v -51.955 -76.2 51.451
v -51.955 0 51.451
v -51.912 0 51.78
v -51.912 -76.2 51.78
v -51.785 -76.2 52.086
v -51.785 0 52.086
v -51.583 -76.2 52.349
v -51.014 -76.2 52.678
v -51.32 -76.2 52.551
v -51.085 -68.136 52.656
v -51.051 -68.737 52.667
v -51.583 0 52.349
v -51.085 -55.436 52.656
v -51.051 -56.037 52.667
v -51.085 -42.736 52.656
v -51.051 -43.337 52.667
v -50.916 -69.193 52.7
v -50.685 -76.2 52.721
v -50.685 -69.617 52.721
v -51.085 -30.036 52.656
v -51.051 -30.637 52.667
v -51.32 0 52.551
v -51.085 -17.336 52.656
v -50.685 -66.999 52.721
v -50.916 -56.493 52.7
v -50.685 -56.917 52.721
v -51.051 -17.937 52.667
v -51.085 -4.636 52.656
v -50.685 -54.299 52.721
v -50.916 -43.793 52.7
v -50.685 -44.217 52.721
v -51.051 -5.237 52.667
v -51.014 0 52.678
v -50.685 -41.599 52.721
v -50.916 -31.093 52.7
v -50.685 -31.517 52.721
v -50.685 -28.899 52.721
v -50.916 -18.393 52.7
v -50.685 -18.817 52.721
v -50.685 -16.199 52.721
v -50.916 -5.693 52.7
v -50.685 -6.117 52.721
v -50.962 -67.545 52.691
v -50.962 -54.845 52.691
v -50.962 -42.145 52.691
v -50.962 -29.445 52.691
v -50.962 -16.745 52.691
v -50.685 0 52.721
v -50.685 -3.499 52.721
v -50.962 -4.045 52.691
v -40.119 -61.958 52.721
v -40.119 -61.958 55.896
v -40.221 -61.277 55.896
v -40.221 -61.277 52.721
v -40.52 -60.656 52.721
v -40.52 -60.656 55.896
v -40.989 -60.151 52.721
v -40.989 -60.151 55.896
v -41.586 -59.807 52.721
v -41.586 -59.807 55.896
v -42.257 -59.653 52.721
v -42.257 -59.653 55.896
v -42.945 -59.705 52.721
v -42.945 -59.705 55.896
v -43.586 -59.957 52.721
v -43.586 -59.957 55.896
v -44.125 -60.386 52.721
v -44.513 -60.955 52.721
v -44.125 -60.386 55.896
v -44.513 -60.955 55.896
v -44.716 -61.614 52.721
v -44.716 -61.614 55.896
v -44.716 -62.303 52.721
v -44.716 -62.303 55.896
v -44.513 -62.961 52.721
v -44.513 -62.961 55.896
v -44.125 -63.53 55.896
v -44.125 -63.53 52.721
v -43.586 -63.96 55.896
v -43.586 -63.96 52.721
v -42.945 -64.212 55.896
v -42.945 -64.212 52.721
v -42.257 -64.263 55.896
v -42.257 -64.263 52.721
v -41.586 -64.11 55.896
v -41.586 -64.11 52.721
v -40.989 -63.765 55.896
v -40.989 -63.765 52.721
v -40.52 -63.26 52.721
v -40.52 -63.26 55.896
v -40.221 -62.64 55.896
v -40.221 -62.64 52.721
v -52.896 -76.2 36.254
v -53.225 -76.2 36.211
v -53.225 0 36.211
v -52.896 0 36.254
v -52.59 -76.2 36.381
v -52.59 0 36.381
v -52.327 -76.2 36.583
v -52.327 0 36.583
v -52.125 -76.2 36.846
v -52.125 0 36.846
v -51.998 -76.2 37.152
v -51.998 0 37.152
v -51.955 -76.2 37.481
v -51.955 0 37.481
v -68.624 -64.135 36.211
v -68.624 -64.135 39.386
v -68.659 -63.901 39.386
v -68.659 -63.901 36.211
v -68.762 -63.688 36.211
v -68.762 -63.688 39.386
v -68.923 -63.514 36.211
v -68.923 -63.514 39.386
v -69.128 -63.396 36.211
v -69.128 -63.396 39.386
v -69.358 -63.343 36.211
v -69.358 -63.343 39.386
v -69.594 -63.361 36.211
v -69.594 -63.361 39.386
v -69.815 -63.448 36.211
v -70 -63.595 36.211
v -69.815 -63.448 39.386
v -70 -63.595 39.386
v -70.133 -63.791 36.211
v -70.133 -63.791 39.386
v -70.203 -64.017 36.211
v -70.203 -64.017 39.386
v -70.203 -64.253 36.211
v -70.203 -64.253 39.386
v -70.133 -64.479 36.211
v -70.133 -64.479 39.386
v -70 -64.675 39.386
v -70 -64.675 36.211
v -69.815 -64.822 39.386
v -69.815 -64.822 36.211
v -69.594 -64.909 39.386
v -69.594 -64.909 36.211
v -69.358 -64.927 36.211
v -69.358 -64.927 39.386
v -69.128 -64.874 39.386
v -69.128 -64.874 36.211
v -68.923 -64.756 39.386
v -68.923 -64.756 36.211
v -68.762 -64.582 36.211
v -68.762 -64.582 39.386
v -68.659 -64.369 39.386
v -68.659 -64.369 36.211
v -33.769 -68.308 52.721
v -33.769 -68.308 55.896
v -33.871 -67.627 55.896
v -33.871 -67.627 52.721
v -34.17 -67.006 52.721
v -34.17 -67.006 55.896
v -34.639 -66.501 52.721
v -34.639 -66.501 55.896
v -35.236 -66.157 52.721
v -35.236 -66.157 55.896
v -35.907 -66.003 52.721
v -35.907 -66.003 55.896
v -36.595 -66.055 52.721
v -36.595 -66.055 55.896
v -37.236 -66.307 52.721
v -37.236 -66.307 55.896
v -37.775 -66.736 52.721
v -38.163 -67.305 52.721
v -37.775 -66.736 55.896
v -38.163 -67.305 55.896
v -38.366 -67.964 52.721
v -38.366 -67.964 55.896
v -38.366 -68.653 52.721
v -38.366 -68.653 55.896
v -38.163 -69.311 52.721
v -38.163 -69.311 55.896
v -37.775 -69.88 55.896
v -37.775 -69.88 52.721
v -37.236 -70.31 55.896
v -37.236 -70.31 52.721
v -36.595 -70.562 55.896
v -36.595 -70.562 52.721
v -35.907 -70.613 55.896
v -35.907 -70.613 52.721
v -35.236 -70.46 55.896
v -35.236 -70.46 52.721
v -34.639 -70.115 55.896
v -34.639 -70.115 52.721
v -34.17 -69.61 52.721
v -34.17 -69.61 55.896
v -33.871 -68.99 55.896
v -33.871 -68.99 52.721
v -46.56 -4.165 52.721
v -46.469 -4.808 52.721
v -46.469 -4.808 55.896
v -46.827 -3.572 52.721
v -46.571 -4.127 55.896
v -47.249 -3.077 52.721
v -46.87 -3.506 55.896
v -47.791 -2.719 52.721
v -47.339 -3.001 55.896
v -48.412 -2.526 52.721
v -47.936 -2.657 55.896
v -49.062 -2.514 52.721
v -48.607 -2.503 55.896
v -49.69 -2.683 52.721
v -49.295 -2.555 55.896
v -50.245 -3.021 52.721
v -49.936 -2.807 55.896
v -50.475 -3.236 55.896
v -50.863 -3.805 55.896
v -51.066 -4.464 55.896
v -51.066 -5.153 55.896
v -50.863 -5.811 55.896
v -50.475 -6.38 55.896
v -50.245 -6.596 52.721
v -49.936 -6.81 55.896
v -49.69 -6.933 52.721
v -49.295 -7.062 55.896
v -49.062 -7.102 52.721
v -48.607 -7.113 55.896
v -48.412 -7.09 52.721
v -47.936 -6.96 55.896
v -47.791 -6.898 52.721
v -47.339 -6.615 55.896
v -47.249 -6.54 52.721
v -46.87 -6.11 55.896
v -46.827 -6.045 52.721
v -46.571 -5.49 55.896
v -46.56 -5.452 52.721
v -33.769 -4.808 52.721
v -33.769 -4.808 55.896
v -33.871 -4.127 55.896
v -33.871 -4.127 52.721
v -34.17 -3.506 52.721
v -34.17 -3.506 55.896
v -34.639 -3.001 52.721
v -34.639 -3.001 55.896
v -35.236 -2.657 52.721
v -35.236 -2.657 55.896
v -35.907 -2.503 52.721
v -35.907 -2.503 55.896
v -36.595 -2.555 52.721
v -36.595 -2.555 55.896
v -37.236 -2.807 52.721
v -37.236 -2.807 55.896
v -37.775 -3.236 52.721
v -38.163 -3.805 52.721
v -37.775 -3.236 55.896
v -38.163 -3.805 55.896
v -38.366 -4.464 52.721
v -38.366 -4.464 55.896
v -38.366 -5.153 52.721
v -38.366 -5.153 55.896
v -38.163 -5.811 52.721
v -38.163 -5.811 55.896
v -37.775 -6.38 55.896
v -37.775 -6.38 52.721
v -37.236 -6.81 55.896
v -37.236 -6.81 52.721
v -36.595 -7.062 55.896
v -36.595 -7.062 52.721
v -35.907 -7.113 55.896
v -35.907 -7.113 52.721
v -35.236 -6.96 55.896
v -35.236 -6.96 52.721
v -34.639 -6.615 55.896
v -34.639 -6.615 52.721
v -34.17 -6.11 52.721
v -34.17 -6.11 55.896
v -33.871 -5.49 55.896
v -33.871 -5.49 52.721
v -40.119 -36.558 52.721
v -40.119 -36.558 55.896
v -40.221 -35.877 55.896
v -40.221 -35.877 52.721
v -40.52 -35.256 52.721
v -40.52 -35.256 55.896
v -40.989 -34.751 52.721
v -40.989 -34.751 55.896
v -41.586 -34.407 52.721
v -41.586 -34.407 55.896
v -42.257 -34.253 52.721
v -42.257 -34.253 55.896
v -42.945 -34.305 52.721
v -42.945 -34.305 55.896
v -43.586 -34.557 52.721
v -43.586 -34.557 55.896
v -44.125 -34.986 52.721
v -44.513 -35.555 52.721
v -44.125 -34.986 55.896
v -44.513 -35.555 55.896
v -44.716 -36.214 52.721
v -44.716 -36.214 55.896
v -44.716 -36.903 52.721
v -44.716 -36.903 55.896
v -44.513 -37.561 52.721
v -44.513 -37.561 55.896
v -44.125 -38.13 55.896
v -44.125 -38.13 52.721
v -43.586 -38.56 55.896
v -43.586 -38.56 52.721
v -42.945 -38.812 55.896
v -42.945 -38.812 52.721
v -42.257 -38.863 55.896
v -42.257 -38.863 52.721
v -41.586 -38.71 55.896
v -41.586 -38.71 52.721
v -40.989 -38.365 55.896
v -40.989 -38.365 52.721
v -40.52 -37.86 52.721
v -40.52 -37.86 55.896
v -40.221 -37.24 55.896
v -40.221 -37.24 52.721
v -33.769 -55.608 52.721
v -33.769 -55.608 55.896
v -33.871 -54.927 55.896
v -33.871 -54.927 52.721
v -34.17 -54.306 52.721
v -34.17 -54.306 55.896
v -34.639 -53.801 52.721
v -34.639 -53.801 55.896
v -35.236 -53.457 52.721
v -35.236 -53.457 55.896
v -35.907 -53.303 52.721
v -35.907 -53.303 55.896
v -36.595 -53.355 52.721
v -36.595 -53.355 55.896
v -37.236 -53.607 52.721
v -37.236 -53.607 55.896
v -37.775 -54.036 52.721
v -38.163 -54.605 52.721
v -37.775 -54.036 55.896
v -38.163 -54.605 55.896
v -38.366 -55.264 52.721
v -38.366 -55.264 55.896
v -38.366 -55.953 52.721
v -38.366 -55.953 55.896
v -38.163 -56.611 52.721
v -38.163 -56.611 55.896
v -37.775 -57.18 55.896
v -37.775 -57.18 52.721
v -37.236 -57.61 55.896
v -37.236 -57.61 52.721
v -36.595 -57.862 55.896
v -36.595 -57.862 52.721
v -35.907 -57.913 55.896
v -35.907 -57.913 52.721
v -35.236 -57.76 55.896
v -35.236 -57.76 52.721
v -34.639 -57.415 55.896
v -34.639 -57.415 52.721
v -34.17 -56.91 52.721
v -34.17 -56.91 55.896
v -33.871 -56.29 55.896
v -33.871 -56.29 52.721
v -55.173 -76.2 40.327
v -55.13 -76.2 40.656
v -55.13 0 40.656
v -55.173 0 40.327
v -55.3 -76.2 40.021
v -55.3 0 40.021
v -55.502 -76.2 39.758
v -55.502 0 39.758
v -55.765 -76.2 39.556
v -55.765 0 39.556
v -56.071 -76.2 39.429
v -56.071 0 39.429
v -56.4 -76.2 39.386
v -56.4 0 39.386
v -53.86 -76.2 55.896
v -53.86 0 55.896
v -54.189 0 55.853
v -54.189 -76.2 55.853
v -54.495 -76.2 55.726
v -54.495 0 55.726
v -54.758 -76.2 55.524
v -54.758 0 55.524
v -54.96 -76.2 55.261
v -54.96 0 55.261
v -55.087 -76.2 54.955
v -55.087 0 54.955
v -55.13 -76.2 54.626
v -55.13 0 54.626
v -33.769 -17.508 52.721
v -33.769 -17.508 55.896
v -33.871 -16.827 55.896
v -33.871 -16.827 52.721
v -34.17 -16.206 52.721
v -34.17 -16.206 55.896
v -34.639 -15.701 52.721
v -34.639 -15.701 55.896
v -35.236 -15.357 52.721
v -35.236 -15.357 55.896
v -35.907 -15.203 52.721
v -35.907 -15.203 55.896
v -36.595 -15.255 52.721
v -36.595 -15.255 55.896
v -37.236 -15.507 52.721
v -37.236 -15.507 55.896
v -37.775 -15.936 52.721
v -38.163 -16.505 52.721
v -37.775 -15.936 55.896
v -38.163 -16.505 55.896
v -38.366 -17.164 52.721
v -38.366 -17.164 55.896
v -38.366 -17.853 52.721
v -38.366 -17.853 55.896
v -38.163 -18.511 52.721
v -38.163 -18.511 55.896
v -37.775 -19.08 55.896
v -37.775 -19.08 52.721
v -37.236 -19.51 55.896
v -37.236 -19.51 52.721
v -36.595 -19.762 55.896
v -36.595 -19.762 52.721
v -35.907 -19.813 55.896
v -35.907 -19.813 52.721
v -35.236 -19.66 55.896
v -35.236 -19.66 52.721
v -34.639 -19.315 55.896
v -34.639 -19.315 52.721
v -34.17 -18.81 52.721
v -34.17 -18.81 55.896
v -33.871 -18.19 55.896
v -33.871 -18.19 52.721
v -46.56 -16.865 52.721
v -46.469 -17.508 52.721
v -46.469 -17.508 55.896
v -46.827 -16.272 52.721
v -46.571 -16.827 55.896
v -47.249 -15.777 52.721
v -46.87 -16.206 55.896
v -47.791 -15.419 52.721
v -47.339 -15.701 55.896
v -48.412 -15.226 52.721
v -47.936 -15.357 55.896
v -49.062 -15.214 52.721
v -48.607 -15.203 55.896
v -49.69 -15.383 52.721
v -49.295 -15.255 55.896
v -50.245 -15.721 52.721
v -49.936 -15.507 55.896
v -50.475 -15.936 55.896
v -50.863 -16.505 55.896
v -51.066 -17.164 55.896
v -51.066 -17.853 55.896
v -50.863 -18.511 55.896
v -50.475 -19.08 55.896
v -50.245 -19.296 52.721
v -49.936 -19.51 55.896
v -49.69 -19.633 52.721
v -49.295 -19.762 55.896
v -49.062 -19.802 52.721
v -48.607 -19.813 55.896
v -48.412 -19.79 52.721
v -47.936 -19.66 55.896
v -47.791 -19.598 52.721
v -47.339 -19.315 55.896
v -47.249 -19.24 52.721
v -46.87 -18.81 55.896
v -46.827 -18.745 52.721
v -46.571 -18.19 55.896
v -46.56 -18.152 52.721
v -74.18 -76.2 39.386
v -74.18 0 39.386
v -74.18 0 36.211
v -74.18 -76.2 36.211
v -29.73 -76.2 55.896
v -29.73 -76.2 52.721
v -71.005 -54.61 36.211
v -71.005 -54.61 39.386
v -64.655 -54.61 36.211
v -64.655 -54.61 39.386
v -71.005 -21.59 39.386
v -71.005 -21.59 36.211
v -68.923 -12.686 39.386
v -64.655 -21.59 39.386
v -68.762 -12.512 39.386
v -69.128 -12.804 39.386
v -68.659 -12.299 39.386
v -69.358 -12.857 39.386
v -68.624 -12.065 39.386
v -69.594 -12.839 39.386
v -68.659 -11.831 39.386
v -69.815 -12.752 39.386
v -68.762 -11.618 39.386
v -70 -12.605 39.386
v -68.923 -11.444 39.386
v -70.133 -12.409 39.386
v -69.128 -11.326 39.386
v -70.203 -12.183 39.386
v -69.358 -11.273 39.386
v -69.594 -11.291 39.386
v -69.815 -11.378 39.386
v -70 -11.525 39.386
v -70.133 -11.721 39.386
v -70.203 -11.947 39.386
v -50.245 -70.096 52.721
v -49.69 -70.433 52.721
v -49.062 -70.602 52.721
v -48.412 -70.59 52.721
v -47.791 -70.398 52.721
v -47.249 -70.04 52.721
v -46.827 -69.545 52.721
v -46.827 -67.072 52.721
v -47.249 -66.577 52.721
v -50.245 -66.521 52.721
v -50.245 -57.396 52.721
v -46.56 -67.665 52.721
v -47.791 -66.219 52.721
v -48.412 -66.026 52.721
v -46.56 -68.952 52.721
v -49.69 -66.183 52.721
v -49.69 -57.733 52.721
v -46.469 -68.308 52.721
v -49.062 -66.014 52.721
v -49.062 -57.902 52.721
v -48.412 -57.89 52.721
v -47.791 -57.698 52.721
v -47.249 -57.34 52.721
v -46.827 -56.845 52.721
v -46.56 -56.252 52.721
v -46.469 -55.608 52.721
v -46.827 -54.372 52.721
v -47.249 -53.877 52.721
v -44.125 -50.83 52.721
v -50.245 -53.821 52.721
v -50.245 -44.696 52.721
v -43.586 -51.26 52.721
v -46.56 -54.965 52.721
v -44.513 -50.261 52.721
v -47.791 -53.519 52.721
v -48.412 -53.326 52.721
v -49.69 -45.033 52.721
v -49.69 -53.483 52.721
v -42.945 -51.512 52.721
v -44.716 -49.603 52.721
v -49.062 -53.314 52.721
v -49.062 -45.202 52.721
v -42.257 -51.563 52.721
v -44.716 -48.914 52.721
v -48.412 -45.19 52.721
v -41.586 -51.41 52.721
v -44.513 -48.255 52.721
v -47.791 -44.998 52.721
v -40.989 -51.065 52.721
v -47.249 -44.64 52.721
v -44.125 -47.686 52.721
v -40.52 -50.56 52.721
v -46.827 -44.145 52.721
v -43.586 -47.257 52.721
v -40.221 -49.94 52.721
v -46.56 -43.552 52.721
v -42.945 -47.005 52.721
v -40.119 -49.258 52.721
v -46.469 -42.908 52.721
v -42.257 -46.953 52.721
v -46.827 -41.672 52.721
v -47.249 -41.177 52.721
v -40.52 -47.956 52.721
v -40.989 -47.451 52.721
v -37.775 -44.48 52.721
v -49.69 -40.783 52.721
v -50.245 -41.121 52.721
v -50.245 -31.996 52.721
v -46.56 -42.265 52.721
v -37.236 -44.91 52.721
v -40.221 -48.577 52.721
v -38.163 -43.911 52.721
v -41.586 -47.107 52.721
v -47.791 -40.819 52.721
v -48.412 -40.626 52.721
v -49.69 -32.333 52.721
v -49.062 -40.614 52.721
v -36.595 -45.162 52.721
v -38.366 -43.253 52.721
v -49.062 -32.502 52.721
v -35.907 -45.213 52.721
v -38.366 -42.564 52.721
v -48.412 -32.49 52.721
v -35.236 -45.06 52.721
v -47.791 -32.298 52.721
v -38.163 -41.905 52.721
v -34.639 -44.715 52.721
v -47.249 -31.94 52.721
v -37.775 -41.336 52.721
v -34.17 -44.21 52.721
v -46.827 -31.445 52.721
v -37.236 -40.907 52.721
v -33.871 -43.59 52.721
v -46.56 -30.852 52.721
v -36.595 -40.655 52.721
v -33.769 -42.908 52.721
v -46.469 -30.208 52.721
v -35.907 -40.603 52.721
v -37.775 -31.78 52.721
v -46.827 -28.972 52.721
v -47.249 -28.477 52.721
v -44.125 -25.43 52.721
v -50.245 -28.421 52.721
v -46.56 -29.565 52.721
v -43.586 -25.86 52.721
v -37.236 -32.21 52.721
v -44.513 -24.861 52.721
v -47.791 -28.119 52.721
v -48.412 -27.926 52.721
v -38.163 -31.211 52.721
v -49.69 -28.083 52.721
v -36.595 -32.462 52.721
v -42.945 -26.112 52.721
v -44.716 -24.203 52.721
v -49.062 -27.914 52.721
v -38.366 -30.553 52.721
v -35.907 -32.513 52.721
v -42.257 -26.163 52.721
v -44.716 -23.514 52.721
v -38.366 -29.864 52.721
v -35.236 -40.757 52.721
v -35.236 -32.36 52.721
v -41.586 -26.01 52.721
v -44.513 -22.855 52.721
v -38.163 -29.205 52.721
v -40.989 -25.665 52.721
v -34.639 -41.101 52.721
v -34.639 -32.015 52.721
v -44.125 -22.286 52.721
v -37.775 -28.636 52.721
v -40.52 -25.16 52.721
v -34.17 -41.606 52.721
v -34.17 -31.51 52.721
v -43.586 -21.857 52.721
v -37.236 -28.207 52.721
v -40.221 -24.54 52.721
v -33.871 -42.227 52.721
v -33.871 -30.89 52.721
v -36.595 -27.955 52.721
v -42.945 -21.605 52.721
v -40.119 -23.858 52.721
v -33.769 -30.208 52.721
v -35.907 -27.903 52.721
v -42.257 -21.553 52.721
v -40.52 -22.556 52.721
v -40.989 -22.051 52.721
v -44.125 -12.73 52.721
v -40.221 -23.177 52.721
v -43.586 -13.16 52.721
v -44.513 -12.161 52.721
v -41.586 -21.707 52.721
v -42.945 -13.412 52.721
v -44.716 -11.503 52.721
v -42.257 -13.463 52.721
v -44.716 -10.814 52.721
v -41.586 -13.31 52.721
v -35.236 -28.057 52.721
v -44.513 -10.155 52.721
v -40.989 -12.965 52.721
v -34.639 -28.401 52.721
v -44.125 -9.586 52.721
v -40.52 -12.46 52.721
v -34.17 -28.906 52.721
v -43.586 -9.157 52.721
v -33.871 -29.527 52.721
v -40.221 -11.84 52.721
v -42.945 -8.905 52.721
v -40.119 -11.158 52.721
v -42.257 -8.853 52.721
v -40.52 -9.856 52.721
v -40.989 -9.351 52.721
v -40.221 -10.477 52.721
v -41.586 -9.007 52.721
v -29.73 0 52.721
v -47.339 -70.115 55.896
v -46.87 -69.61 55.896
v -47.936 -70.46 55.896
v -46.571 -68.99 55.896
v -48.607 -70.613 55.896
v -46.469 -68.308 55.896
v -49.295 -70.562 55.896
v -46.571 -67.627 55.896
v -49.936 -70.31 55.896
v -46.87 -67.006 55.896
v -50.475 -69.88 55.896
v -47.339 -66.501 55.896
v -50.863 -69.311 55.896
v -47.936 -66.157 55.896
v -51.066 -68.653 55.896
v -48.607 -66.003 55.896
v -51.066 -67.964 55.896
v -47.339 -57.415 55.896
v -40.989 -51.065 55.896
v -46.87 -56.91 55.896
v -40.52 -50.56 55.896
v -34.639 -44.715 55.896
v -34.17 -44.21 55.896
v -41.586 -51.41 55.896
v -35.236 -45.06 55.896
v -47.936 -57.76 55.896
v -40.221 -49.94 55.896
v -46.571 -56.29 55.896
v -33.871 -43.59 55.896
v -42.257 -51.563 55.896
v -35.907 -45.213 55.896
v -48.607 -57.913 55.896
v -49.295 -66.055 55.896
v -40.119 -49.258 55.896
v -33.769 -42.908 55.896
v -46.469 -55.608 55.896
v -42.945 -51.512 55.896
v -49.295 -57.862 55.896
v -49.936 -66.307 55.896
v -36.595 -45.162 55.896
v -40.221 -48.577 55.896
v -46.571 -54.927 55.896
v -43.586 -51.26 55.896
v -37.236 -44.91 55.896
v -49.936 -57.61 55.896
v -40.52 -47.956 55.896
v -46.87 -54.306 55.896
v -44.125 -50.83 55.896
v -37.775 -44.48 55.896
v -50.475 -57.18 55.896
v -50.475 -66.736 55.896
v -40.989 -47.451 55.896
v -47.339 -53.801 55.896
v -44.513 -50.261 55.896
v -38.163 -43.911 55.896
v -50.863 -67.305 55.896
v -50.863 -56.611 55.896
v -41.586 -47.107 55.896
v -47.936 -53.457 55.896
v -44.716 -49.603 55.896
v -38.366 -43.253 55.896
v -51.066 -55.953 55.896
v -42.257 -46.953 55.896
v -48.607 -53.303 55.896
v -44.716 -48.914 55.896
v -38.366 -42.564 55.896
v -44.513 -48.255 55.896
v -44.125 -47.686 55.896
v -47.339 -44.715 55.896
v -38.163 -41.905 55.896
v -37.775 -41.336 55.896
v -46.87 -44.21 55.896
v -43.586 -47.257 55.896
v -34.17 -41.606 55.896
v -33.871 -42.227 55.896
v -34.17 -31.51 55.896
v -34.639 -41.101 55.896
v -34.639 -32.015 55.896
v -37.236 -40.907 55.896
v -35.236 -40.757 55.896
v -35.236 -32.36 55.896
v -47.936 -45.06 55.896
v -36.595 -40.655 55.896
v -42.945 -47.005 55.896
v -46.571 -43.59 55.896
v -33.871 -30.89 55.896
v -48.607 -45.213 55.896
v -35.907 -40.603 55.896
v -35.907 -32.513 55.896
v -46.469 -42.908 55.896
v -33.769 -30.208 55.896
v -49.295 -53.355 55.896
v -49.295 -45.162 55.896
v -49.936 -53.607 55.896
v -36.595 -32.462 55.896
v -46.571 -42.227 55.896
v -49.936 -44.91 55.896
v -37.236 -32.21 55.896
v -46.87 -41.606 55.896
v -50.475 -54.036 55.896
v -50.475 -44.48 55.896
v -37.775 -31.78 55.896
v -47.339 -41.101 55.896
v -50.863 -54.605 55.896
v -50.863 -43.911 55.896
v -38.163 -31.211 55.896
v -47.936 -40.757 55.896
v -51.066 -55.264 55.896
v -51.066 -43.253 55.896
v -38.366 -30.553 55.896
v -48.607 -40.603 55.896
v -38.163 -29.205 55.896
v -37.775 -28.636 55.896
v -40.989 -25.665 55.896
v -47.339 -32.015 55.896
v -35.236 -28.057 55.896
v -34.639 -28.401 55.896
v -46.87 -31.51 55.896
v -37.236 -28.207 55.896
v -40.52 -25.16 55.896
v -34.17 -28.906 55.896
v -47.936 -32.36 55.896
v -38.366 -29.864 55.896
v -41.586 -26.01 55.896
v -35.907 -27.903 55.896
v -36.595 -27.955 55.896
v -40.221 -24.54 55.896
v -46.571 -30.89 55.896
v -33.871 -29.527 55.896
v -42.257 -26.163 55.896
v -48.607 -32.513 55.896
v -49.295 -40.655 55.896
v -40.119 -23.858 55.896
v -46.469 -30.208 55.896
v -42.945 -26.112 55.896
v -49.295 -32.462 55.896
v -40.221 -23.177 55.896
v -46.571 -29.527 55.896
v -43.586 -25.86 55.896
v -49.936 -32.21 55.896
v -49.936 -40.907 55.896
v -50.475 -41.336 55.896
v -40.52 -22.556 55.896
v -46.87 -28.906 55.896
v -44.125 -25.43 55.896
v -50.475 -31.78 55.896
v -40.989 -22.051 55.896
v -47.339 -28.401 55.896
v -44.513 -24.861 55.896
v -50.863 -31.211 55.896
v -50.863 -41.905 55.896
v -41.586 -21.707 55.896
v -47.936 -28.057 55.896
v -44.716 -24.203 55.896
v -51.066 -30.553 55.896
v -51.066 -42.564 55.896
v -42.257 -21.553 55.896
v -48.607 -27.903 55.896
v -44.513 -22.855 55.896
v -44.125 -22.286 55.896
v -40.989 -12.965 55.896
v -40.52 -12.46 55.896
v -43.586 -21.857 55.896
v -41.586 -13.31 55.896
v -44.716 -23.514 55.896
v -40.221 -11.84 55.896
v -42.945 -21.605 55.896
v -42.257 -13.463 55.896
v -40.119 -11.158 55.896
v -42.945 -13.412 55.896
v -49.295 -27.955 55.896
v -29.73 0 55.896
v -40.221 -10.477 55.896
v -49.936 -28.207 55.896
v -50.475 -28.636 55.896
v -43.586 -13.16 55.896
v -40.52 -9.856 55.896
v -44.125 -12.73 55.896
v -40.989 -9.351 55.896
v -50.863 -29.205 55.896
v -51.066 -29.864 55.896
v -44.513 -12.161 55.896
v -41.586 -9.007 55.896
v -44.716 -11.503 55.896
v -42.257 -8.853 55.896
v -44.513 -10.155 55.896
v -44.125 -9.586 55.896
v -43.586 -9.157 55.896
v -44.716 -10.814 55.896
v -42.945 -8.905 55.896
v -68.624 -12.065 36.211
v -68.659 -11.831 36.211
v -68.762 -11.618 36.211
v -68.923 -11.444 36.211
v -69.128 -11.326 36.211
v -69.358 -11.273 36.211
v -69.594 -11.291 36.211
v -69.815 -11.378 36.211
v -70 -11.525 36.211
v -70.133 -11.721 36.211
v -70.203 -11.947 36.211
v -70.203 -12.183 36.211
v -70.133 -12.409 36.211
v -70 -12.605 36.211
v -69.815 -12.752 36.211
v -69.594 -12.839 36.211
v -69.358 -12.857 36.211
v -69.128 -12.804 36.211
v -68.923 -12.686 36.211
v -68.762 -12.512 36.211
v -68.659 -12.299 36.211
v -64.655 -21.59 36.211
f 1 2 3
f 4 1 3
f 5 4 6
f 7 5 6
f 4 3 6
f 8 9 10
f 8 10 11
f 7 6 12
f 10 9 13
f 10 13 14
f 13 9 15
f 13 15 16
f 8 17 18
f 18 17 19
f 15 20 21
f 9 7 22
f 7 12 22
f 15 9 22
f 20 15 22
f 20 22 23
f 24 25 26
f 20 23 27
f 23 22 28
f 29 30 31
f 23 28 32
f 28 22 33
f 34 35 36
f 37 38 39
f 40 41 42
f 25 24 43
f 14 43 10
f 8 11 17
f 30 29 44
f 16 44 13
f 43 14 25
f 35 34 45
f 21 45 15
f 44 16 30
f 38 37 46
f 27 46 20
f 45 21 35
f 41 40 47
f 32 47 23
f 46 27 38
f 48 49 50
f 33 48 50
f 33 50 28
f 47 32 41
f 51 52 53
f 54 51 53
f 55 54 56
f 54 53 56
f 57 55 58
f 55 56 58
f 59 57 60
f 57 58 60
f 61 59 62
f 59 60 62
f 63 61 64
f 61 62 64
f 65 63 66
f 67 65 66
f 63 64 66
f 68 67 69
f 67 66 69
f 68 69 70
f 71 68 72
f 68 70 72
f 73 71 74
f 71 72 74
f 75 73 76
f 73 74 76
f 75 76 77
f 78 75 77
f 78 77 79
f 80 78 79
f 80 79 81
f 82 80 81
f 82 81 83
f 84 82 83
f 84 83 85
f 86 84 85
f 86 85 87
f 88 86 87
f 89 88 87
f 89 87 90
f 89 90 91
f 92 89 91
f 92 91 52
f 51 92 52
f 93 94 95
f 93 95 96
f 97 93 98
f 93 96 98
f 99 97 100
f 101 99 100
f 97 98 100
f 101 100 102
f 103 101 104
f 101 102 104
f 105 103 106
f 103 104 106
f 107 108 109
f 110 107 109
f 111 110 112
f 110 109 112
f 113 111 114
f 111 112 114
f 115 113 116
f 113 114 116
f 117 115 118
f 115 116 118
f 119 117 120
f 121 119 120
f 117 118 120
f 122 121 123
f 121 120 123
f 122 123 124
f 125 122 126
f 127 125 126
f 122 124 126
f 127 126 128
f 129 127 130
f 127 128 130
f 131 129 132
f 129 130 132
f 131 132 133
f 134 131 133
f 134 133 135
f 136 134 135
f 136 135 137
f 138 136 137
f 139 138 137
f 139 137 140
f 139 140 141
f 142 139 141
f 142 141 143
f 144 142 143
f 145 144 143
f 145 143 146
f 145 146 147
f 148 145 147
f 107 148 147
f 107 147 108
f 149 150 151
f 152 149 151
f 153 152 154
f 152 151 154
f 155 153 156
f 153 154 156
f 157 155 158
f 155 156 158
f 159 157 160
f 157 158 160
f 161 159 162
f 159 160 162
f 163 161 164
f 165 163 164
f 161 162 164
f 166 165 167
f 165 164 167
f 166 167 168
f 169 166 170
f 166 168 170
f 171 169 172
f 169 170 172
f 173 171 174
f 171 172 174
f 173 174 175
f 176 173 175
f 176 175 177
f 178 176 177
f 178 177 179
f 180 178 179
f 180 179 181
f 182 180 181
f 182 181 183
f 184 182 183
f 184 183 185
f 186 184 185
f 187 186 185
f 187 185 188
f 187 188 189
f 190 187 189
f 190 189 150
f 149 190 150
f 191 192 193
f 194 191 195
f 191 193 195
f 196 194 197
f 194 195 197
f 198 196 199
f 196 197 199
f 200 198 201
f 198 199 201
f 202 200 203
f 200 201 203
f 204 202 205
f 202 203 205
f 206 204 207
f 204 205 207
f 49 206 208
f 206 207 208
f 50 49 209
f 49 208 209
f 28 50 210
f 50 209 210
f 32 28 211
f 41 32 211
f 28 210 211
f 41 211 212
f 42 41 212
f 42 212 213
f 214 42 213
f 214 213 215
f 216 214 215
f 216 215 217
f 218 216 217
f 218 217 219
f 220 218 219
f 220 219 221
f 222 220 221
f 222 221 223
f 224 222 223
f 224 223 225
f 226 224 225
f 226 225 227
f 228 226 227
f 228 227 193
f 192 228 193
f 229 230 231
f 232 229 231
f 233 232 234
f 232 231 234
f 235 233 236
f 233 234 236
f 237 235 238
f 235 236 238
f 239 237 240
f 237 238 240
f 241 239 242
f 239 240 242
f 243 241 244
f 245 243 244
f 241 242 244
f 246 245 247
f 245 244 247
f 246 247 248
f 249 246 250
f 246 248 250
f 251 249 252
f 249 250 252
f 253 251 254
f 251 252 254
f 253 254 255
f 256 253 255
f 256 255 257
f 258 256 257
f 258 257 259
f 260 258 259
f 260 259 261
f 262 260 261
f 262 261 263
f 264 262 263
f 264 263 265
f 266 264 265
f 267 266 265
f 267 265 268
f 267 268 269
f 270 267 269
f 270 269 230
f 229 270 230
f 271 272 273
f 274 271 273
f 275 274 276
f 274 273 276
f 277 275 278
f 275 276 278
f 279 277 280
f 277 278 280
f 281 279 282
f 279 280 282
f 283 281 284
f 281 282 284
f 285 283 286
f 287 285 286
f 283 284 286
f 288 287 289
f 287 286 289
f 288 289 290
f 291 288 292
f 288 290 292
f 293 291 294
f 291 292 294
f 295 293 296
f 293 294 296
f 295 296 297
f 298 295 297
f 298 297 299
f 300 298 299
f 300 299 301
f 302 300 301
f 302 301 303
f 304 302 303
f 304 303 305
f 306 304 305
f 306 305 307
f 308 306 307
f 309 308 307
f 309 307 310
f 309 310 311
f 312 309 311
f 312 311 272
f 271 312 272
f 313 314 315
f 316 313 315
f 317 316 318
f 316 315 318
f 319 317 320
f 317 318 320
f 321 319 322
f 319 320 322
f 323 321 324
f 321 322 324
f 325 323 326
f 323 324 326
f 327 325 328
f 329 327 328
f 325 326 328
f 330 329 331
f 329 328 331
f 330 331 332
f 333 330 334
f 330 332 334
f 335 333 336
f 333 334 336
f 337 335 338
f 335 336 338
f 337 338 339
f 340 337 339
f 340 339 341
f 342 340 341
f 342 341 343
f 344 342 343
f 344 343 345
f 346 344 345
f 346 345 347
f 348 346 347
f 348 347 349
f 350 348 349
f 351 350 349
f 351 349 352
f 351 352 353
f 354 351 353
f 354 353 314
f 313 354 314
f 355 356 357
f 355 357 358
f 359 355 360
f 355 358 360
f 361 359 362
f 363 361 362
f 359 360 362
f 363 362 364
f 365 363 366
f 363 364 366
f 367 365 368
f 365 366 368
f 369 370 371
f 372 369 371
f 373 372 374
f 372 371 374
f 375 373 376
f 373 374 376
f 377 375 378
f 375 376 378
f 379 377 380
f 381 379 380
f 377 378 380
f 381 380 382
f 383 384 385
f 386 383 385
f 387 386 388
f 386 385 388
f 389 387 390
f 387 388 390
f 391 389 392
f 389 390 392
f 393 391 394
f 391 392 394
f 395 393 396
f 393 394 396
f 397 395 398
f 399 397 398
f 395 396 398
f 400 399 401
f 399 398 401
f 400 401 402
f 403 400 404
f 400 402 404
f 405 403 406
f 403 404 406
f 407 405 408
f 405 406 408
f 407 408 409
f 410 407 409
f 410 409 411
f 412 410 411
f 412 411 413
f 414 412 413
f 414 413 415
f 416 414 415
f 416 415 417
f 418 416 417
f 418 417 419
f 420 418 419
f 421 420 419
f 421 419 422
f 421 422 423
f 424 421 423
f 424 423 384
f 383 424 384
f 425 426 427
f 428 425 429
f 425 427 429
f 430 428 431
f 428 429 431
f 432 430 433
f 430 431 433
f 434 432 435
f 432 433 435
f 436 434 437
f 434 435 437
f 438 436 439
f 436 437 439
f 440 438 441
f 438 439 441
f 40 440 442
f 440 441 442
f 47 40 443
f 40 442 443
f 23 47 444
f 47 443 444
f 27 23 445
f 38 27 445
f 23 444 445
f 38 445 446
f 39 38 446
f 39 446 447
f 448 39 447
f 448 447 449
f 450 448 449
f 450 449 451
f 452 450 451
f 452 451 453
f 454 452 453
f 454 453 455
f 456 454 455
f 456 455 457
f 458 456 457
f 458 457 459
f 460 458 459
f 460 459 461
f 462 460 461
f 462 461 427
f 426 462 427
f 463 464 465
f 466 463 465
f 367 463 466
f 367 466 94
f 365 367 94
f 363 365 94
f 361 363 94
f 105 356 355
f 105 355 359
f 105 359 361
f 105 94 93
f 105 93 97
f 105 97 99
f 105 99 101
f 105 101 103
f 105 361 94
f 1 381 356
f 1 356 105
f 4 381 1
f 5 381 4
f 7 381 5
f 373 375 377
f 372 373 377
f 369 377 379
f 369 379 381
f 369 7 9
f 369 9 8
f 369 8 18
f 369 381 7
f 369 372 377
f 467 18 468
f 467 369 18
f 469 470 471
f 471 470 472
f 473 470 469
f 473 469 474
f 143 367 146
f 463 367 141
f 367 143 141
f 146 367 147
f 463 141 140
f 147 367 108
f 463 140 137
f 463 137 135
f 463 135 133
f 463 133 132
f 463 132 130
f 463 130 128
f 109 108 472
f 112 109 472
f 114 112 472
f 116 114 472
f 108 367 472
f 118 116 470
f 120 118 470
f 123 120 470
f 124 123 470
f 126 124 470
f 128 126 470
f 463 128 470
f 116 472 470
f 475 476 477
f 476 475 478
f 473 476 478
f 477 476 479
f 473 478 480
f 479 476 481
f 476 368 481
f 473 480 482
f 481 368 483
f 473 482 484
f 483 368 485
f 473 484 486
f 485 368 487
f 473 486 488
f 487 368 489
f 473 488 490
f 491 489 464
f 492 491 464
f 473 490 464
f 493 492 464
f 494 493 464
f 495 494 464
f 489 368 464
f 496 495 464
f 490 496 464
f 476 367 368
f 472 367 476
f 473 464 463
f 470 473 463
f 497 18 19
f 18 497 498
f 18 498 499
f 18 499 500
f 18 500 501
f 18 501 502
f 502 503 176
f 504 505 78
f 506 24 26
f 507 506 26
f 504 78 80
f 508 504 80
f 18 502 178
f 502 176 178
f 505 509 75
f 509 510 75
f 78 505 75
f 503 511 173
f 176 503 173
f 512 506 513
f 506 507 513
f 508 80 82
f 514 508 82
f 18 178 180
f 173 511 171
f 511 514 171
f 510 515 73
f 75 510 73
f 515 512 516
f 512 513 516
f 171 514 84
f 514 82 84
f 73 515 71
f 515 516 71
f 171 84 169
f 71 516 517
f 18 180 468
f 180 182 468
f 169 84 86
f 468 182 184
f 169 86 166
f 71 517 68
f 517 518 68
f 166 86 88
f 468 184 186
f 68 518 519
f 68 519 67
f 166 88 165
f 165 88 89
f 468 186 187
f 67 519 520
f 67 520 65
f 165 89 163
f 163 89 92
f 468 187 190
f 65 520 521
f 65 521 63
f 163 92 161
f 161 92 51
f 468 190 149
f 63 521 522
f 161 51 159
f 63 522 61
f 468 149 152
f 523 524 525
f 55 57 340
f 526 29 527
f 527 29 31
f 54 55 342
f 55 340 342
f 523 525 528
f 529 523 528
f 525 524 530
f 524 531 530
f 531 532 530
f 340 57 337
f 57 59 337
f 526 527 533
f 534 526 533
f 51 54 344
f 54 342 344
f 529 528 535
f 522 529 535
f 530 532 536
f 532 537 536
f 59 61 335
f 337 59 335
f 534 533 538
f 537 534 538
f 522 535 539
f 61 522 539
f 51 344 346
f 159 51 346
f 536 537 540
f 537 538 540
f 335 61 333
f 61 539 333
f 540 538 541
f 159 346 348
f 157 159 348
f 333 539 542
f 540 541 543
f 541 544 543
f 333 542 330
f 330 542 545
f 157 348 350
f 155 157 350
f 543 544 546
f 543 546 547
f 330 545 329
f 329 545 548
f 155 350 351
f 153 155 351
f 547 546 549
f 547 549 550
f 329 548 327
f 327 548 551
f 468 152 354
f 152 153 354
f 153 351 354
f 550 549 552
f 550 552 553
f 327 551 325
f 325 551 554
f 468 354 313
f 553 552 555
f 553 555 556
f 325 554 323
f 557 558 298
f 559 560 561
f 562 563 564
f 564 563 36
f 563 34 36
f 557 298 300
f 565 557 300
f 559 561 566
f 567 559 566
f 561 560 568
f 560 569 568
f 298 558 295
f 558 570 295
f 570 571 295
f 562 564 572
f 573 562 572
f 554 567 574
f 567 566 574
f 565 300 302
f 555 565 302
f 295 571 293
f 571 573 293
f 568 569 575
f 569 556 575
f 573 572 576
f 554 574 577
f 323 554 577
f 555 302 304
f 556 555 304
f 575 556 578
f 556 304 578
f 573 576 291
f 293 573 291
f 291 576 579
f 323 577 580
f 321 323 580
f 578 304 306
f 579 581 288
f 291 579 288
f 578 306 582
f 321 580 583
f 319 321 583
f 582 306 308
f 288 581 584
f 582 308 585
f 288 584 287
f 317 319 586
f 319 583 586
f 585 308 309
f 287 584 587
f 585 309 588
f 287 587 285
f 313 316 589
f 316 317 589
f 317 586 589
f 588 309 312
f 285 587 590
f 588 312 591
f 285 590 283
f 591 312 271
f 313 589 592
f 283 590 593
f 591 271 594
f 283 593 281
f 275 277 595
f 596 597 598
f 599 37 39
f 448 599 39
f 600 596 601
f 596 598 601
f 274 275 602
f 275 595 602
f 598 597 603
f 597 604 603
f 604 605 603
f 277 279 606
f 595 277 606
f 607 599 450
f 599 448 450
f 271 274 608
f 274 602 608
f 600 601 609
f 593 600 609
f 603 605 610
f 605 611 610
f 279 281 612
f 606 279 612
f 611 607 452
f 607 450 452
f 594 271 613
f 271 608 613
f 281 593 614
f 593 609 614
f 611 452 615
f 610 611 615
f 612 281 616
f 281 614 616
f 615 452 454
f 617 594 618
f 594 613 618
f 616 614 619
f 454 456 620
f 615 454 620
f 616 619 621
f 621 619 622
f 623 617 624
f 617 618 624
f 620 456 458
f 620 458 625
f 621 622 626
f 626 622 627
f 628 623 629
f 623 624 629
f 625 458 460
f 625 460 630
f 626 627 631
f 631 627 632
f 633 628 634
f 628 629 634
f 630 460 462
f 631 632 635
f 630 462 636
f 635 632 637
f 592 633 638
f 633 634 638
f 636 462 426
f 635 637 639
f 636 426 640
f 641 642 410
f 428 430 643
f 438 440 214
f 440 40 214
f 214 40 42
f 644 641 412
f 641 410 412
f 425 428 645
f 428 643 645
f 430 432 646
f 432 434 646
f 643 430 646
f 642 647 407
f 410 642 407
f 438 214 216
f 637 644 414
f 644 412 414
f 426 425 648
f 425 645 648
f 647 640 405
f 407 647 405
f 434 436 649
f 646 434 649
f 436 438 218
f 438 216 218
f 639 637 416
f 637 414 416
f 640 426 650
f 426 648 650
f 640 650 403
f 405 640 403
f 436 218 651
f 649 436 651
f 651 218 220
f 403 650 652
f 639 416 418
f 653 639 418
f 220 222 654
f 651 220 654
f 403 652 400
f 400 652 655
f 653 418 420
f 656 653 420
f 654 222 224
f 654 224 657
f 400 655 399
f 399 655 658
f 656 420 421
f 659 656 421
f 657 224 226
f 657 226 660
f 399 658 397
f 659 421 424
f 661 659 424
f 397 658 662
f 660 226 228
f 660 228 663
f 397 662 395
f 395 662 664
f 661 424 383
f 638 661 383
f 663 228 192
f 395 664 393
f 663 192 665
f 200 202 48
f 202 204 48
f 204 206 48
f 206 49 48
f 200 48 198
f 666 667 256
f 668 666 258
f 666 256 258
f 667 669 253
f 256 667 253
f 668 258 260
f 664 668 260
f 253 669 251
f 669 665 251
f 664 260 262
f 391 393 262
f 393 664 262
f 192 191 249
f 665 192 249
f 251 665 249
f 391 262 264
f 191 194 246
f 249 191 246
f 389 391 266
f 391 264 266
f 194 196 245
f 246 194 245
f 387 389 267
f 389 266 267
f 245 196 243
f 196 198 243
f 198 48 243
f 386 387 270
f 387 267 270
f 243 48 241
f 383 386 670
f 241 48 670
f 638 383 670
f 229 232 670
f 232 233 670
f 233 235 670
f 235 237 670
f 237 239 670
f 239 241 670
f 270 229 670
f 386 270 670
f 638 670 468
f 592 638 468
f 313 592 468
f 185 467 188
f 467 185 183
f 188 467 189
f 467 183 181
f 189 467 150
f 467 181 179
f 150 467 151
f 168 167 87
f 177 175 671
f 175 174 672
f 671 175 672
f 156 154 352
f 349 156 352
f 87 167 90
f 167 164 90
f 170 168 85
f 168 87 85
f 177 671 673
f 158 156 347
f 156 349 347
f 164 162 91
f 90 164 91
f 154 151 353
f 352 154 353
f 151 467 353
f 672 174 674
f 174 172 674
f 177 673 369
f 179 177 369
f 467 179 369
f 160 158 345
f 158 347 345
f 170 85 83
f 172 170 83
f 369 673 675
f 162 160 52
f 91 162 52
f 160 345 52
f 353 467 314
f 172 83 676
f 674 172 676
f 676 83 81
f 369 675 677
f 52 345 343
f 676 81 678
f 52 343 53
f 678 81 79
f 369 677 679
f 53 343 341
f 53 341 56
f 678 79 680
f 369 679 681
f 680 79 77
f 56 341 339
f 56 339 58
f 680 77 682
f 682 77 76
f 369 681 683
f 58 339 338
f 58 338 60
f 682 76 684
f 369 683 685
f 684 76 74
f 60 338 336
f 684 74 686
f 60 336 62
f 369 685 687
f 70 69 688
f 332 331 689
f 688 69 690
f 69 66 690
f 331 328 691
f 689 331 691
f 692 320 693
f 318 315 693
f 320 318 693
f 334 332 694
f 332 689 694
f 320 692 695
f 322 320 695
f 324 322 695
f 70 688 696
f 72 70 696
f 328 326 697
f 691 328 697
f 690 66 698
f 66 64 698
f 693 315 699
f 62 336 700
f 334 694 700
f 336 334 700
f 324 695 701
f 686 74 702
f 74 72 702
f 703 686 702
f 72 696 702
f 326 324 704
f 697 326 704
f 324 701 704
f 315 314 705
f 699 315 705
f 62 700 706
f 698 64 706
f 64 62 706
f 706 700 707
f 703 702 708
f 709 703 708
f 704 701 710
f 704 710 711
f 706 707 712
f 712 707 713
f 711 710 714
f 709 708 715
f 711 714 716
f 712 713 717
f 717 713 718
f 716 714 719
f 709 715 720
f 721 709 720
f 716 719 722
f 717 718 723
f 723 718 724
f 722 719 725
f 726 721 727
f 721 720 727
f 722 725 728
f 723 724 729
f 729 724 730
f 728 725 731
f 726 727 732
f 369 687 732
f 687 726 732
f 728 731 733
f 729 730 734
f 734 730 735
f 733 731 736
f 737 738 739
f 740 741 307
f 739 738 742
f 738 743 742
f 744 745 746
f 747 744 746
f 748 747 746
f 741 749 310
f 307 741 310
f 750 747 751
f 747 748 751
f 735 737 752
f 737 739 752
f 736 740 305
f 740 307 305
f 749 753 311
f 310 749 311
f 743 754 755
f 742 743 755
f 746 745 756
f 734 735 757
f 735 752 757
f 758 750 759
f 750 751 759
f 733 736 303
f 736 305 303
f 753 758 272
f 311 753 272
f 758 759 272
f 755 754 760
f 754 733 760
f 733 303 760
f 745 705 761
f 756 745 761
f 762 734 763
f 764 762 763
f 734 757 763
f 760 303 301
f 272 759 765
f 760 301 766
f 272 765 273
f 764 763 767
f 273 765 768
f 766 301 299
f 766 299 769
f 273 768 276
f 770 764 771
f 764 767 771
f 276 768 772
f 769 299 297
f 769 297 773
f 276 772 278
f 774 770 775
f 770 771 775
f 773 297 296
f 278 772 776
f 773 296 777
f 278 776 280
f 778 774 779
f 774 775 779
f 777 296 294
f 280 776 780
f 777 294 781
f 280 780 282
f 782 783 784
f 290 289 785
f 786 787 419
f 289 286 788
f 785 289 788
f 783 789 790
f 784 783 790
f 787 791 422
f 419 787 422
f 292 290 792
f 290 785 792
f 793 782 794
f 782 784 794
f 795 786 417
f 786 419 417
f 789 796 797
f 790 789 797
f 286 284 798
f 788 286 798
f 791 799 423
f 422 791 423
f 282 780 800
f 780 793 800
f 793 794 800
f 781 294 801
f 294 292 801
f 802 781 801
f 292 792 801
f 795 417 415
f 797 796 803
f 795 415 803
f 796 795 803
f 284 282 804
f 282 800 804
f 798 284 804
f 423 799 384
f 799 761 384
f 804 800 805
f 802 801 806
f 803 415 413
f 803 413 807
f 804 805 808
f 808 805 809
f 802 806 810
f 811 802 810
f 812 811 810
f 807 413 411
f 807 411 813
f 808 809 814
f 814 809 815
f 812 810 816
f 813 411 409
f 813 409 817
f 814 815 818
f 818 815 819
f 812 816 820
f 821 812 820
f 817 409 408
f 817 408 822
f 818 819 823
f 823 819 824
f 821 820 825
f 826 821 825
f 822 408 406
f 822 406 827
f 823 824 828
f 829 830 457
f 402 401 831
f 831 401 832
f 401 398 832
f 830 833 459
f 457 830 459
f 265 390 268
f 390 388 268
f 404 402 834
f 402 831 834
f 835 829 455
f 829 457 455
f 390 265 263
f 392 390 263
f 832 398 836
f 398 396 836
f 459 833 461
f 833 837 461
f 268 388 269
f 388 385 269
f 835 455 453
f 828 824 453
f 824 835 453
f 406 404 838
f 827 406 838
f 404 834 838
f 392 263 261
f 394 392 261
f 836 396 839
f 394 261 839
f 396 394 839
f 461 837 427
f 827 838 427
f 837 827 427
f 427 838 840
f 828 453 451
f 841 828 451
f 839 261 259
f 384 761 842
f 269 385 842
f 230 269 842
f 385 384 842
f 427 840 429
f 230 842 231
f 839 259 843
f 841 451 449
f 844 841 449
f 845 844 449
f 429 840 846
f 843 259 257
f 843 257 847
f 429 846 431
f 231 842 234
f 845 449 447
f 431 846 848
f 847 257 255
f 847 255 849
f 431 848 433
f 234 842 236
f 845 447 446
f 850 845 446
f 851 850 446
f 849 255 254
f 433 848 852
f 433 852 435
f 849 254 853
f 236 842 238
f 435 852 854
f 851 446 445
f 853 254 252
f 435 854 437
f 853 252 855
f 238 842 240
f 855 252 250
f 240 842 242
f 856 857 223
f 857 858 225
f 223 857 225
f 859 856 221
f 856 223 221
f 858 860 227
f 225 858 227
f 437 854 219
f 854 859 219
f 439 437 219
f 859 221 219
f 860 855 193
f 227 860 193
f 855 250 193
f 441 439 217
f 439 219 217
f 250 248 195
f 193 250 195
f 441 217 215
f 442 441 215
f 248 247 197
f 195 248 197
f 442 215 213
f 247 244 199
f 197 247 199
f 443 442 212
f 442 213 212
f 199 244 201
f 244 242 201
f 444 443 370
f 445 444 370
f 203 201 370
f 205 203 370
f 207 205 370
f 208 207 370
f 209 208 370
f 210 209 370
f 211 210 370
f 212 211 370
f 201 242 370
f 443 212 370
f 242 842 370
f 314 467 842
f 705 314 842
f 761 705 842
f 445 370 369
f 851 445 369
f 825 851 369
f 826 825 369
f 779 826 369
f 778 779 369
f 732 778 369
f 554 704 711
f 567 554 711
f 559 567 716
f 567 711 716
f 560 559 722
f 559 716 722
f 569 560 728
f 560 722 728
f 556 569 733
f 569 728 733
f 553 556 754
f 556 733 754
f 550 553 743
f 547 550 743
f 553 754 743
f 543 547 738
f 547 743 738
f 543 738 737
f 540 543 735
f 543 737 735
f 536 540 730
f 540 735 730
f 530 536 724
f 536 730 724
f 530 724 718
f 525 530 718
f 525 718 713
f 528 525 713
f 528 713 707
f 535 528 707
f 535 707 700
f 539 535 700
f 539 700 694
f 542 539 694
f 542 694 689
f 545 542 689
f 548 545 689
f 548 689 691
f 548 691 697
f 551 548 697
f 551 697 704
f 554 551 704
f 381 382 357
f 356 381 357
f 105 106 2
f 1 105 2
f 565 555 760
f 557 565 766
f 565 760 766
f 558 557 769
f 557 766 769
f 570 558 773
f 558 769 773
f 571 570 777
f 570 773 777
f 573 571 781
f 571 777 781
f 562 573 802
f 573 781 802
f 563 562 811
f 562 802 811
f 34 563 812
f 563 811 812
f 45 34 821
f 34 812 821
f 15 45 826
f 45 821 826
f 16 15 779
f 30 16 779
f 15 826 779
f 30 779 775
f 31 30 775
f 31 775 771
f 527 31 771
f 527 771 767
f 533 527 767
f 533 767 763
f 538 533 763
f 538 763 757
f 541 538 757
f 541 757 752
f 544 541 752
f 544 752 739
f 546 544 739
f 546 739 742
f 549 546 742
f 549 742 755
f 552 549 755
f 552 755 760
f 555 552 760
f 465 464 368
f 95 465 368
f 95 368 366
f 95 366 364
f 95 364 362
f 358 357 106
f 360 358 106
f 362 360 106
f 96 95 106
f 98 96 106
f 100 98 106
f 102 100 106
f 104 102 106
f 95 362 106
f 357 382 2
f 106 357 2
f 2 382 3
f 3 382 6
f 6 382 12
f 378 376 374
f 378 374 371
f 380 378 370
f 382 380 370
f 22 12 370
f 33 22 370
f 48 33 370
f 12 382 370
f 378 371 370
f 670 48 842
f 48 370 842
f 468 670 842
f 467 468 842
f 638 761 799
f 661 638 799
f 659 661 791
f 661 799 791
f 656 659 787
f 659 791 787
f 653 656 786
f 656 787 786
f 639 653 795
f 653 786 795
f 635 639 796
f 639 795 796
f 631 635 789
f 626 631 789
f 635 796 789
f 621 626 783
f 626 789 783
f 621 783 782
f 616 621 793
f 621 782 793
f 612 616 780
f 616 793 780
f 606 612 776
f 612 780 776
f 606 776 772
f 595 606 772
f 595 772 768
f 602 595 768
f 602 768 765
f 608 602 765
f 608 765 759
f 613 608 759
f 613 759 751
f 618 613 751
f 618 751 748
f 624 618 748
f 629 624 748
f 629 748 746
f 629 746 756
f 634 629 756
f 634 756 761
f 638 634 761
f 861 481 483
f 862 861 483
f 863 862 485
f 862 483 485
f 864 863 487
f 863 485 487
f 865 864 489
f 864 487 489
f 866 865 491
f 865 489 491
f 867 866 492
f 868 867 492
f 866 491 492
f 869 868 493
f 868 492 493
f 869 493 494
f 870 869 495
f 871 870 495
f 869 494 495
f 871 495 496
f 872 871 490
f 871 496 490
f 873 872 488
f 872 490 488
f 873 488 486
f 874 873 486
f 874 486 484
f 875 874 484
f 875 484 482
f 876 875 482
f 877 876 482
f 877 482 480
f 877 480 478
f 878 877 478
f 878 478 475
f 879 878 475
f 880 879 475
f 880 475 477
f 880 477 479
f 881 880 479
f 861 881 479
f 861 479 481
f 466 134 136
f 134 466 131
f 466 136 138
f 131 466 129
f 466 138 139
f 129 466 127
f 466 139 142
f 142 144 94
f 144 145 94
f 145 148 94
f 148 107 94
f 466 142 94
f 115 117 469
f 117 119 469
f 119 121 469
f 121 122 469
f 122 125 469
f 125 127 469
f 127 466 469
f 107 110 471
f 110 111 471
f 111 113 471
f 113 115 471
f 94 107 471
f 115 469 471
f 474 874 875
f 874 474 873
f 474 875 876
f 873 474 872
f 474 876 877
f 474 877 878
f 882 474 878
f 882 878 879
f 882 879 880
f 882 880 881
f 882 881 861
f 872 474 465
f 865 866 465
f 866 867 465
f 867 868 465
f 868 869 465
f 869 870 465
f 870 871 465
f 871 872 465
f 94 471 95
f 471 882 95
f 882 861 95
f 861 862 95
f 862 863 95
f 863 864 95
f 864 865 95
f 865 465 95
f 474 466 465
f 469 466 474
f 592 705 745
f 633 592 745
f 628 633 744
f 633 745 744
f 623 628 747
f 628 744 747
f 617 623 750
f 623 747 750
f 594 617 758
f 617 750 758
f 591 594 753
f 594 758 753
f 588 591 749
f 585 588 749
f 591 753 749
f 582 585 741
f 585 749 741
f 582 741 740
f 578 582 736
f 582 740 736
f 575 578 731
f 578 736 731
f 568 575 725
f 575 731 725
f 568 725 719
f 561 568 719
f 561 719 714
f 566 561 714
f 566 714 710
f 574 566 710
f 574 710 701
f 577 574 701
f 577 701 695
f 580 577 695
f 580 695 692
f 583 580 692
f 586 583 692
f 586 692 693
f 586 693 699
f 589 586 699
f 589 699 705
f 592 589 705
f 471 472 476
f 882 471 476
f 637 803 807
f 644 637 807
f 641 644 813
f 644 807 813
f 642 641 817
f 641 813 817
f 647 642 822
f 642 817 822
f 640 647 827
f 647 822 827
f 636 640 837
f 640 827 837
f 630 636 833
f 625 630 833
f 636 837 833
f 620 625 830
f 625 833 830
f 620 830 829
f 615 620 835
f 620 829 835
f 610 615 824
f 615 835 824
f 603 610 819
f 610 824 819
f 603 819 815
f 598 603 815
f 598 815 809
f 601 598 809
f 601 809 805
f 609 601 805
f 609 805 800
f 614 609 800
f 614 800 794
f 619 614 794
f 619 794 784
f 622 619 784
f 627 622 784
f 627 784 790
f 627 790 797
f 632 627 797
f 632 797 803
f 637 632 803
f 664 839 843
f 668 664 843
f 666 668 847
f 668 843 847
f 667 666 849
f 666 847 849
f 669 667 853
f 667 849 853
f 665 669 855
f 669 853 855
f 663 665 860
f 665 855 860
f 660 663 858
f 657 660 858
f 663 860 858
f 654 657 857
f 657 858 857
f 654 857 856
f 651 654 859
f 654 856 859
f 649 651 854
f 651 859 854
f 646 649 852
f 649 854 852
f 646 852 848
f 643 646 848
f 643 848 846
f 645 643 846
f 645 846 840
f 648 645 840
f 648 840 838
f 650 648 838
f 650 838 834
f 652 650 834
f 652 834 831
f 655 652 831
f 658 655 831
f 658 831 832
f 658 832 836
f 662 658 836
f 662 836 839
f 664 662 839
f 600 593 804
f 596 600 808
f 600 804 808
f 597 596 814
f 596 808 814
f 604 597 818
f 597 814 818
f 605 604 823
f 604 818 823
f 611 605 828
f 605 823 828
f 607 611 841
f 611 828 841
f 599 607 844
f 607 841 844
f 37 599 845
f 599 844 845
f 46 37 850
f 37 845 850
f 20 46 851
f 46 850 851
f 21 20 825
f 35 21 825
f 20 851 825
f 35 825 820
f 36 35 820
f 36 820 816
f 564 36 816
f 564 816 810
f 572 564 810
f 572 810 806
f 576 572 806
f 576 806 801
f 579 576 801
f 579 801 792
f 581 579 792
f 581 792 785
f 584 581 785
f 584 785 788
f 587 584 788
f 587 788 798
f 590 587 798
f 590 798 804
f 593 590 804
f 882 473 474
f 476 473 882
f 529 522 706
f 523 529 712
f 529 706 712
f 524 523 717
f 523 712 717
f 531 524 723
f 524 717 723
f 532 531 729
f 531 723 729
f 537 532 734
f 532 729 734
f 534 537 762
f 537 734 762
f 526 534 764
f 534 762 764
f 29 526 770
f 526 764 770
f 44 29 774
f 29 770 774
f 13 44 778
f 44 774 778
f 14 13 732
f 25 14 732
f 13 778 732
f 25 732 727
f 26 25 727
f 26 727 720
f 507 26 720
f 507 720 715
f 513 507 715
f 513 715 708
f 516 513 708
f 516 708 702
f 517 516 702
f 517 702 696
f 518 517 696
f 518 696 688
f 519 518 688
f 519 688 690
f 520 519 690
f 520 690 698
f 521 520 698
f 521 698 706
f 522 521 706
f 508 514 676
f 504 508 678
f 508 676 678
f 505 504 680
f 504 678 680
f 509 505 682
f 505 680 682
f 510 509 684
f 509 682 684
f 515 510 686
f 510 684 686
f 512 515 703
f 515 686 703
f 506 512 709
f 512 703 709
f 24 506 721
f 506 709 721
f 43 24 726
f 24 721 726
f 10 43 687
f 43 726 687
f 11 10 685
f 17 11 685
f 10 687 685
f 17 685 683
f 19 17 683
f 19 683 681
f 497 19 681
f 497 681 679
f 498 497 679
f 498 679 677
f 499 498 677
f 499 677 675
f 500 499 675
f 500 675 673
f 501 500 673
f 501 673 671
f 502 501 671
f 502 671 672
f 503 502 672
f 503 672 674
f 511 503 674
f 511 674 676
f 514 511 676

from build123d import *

# Parameters (mm, degrees)
F1_DEPTH = 76.2
F2_R     = 0.79375
F2_W     = 6.35
F2_H     = 33.02
F3_DEPTH = 5.842
F4_R     = 2.3114
F5_DEPTH = 3.81


with BuildPart() as f1:
    # F0 (on Front) → F1 (new body)
    with BuildSketch(Plane.XZ):
        with BuildLine():
            Line((-29.730175, 55.896019), (-53.860175, 55.896019))
            ThreePointArc((-53.860175, 55.896019), (-54.7582, 55.524044), (-55.130175, 54.626019))
            Line((-55.130175, 54.626019), (-55.130175, 52.721019))
            Line((-55.130175, 52.721019), (-55.130175, 40.656019))
            ThreePointArc((-55.130175, 40.656019), (-55.502149, 39.757993), (-56.400175, 39.386019))
            Line((-56.400175, 39.386019), (-74.180175, 39.386019))
            Line((-74.180175, 39.386019), (-74.180175, 36.211019))
            Line((-74.180175, 36.211019), (-55.130175, 36.211019))
            Line((-55.130175, 36.211019), (-53.225175, 36.211019))
            ThreePointArc((-53.225175, 36.211019), (-52.327149, 36.582993), (-51.955175, 37.481019))
            Line((-51.955175, 37.481019), (-51.955175, 51.451019))
            ThreePointArc((-51.955175, 51.451019), (-51.5832, 52.349044), (-50.685175, 52.721019))
            Line((-50.685175, 52.721019), (-29.730175, 52.721019))
            Line((-29.730175, 52.721019), (-29.730175, 55.896019))
        make_face()
    extrude(amount=F1_DEPTH)

    # F2 (on face) → F3 (cut)
    with BuildSketch(Plane.XY.offset(39.386019)):
        with Locations((-69.417675, -64.135)):
            Circle(F2_R)
        with Locations((-67.830175, -38.1)):
            Rectangle(F2_W, F2_H)
        with Locations((-69.417675, -12.065)):
            Circle(F2_R)
    extrude(amount=-F3_DEPTH, mode=Mode.SUBTRACT)

    # F4 (on face) → F5 (cut)
    with BuildSketch(Plane.XY.offset(55.896019)):
        with Locations((-48.780175, -55.608343)):
            Circle(F4_R)
        with Locations((-48.780175, -68.308343)):
            Circle(F4_R)
        with Locations((-42.430175, -61.958343)):
            Circle(F4_R)
        with Locations((-36.080175, -68.308343)):
            Circle(F4_R)
        with Locations((-36.080175, -55.608343)):
            Circle(F4_R)
        with Locations((-36.080175, -42.908343)):
            Circle(F4_R)
        with Locations((-42.430175, -49.258343)):
            Circle(F4_R)
        with Locations((-48.780175, -42.908343)):
            Circle(F4_R)
        with Locations((-42.430175, -36.558343)):
            Circle(F4_R)
        with Locations((-36.080175, -30.208343)):
            Circle(F4_R)
        with Locations((-48.780175, -30.208343)):
            Circle(F4_R)
        with Locations((-42.430175, -23.858343)):
            Circle(F4_R)
        with Locations((-36.080175, -17.508343)):
            Circle(F4_R)
        with Locations((-42.430175, -11.158343)):
            Circle(F4_R)
        with Locations((-48.780175, -17.508343)):
            Circle(F4_R)
        with Locations((-36.080175, -4.808343)):
            Circle(F4_R)
        with Locations((-48.780175, -4.808343)):
            Circle(F4_R)
    extrude(amount=-F5_DEPTH, mode=Mode.SUBTRACT)


solid = f1.part
